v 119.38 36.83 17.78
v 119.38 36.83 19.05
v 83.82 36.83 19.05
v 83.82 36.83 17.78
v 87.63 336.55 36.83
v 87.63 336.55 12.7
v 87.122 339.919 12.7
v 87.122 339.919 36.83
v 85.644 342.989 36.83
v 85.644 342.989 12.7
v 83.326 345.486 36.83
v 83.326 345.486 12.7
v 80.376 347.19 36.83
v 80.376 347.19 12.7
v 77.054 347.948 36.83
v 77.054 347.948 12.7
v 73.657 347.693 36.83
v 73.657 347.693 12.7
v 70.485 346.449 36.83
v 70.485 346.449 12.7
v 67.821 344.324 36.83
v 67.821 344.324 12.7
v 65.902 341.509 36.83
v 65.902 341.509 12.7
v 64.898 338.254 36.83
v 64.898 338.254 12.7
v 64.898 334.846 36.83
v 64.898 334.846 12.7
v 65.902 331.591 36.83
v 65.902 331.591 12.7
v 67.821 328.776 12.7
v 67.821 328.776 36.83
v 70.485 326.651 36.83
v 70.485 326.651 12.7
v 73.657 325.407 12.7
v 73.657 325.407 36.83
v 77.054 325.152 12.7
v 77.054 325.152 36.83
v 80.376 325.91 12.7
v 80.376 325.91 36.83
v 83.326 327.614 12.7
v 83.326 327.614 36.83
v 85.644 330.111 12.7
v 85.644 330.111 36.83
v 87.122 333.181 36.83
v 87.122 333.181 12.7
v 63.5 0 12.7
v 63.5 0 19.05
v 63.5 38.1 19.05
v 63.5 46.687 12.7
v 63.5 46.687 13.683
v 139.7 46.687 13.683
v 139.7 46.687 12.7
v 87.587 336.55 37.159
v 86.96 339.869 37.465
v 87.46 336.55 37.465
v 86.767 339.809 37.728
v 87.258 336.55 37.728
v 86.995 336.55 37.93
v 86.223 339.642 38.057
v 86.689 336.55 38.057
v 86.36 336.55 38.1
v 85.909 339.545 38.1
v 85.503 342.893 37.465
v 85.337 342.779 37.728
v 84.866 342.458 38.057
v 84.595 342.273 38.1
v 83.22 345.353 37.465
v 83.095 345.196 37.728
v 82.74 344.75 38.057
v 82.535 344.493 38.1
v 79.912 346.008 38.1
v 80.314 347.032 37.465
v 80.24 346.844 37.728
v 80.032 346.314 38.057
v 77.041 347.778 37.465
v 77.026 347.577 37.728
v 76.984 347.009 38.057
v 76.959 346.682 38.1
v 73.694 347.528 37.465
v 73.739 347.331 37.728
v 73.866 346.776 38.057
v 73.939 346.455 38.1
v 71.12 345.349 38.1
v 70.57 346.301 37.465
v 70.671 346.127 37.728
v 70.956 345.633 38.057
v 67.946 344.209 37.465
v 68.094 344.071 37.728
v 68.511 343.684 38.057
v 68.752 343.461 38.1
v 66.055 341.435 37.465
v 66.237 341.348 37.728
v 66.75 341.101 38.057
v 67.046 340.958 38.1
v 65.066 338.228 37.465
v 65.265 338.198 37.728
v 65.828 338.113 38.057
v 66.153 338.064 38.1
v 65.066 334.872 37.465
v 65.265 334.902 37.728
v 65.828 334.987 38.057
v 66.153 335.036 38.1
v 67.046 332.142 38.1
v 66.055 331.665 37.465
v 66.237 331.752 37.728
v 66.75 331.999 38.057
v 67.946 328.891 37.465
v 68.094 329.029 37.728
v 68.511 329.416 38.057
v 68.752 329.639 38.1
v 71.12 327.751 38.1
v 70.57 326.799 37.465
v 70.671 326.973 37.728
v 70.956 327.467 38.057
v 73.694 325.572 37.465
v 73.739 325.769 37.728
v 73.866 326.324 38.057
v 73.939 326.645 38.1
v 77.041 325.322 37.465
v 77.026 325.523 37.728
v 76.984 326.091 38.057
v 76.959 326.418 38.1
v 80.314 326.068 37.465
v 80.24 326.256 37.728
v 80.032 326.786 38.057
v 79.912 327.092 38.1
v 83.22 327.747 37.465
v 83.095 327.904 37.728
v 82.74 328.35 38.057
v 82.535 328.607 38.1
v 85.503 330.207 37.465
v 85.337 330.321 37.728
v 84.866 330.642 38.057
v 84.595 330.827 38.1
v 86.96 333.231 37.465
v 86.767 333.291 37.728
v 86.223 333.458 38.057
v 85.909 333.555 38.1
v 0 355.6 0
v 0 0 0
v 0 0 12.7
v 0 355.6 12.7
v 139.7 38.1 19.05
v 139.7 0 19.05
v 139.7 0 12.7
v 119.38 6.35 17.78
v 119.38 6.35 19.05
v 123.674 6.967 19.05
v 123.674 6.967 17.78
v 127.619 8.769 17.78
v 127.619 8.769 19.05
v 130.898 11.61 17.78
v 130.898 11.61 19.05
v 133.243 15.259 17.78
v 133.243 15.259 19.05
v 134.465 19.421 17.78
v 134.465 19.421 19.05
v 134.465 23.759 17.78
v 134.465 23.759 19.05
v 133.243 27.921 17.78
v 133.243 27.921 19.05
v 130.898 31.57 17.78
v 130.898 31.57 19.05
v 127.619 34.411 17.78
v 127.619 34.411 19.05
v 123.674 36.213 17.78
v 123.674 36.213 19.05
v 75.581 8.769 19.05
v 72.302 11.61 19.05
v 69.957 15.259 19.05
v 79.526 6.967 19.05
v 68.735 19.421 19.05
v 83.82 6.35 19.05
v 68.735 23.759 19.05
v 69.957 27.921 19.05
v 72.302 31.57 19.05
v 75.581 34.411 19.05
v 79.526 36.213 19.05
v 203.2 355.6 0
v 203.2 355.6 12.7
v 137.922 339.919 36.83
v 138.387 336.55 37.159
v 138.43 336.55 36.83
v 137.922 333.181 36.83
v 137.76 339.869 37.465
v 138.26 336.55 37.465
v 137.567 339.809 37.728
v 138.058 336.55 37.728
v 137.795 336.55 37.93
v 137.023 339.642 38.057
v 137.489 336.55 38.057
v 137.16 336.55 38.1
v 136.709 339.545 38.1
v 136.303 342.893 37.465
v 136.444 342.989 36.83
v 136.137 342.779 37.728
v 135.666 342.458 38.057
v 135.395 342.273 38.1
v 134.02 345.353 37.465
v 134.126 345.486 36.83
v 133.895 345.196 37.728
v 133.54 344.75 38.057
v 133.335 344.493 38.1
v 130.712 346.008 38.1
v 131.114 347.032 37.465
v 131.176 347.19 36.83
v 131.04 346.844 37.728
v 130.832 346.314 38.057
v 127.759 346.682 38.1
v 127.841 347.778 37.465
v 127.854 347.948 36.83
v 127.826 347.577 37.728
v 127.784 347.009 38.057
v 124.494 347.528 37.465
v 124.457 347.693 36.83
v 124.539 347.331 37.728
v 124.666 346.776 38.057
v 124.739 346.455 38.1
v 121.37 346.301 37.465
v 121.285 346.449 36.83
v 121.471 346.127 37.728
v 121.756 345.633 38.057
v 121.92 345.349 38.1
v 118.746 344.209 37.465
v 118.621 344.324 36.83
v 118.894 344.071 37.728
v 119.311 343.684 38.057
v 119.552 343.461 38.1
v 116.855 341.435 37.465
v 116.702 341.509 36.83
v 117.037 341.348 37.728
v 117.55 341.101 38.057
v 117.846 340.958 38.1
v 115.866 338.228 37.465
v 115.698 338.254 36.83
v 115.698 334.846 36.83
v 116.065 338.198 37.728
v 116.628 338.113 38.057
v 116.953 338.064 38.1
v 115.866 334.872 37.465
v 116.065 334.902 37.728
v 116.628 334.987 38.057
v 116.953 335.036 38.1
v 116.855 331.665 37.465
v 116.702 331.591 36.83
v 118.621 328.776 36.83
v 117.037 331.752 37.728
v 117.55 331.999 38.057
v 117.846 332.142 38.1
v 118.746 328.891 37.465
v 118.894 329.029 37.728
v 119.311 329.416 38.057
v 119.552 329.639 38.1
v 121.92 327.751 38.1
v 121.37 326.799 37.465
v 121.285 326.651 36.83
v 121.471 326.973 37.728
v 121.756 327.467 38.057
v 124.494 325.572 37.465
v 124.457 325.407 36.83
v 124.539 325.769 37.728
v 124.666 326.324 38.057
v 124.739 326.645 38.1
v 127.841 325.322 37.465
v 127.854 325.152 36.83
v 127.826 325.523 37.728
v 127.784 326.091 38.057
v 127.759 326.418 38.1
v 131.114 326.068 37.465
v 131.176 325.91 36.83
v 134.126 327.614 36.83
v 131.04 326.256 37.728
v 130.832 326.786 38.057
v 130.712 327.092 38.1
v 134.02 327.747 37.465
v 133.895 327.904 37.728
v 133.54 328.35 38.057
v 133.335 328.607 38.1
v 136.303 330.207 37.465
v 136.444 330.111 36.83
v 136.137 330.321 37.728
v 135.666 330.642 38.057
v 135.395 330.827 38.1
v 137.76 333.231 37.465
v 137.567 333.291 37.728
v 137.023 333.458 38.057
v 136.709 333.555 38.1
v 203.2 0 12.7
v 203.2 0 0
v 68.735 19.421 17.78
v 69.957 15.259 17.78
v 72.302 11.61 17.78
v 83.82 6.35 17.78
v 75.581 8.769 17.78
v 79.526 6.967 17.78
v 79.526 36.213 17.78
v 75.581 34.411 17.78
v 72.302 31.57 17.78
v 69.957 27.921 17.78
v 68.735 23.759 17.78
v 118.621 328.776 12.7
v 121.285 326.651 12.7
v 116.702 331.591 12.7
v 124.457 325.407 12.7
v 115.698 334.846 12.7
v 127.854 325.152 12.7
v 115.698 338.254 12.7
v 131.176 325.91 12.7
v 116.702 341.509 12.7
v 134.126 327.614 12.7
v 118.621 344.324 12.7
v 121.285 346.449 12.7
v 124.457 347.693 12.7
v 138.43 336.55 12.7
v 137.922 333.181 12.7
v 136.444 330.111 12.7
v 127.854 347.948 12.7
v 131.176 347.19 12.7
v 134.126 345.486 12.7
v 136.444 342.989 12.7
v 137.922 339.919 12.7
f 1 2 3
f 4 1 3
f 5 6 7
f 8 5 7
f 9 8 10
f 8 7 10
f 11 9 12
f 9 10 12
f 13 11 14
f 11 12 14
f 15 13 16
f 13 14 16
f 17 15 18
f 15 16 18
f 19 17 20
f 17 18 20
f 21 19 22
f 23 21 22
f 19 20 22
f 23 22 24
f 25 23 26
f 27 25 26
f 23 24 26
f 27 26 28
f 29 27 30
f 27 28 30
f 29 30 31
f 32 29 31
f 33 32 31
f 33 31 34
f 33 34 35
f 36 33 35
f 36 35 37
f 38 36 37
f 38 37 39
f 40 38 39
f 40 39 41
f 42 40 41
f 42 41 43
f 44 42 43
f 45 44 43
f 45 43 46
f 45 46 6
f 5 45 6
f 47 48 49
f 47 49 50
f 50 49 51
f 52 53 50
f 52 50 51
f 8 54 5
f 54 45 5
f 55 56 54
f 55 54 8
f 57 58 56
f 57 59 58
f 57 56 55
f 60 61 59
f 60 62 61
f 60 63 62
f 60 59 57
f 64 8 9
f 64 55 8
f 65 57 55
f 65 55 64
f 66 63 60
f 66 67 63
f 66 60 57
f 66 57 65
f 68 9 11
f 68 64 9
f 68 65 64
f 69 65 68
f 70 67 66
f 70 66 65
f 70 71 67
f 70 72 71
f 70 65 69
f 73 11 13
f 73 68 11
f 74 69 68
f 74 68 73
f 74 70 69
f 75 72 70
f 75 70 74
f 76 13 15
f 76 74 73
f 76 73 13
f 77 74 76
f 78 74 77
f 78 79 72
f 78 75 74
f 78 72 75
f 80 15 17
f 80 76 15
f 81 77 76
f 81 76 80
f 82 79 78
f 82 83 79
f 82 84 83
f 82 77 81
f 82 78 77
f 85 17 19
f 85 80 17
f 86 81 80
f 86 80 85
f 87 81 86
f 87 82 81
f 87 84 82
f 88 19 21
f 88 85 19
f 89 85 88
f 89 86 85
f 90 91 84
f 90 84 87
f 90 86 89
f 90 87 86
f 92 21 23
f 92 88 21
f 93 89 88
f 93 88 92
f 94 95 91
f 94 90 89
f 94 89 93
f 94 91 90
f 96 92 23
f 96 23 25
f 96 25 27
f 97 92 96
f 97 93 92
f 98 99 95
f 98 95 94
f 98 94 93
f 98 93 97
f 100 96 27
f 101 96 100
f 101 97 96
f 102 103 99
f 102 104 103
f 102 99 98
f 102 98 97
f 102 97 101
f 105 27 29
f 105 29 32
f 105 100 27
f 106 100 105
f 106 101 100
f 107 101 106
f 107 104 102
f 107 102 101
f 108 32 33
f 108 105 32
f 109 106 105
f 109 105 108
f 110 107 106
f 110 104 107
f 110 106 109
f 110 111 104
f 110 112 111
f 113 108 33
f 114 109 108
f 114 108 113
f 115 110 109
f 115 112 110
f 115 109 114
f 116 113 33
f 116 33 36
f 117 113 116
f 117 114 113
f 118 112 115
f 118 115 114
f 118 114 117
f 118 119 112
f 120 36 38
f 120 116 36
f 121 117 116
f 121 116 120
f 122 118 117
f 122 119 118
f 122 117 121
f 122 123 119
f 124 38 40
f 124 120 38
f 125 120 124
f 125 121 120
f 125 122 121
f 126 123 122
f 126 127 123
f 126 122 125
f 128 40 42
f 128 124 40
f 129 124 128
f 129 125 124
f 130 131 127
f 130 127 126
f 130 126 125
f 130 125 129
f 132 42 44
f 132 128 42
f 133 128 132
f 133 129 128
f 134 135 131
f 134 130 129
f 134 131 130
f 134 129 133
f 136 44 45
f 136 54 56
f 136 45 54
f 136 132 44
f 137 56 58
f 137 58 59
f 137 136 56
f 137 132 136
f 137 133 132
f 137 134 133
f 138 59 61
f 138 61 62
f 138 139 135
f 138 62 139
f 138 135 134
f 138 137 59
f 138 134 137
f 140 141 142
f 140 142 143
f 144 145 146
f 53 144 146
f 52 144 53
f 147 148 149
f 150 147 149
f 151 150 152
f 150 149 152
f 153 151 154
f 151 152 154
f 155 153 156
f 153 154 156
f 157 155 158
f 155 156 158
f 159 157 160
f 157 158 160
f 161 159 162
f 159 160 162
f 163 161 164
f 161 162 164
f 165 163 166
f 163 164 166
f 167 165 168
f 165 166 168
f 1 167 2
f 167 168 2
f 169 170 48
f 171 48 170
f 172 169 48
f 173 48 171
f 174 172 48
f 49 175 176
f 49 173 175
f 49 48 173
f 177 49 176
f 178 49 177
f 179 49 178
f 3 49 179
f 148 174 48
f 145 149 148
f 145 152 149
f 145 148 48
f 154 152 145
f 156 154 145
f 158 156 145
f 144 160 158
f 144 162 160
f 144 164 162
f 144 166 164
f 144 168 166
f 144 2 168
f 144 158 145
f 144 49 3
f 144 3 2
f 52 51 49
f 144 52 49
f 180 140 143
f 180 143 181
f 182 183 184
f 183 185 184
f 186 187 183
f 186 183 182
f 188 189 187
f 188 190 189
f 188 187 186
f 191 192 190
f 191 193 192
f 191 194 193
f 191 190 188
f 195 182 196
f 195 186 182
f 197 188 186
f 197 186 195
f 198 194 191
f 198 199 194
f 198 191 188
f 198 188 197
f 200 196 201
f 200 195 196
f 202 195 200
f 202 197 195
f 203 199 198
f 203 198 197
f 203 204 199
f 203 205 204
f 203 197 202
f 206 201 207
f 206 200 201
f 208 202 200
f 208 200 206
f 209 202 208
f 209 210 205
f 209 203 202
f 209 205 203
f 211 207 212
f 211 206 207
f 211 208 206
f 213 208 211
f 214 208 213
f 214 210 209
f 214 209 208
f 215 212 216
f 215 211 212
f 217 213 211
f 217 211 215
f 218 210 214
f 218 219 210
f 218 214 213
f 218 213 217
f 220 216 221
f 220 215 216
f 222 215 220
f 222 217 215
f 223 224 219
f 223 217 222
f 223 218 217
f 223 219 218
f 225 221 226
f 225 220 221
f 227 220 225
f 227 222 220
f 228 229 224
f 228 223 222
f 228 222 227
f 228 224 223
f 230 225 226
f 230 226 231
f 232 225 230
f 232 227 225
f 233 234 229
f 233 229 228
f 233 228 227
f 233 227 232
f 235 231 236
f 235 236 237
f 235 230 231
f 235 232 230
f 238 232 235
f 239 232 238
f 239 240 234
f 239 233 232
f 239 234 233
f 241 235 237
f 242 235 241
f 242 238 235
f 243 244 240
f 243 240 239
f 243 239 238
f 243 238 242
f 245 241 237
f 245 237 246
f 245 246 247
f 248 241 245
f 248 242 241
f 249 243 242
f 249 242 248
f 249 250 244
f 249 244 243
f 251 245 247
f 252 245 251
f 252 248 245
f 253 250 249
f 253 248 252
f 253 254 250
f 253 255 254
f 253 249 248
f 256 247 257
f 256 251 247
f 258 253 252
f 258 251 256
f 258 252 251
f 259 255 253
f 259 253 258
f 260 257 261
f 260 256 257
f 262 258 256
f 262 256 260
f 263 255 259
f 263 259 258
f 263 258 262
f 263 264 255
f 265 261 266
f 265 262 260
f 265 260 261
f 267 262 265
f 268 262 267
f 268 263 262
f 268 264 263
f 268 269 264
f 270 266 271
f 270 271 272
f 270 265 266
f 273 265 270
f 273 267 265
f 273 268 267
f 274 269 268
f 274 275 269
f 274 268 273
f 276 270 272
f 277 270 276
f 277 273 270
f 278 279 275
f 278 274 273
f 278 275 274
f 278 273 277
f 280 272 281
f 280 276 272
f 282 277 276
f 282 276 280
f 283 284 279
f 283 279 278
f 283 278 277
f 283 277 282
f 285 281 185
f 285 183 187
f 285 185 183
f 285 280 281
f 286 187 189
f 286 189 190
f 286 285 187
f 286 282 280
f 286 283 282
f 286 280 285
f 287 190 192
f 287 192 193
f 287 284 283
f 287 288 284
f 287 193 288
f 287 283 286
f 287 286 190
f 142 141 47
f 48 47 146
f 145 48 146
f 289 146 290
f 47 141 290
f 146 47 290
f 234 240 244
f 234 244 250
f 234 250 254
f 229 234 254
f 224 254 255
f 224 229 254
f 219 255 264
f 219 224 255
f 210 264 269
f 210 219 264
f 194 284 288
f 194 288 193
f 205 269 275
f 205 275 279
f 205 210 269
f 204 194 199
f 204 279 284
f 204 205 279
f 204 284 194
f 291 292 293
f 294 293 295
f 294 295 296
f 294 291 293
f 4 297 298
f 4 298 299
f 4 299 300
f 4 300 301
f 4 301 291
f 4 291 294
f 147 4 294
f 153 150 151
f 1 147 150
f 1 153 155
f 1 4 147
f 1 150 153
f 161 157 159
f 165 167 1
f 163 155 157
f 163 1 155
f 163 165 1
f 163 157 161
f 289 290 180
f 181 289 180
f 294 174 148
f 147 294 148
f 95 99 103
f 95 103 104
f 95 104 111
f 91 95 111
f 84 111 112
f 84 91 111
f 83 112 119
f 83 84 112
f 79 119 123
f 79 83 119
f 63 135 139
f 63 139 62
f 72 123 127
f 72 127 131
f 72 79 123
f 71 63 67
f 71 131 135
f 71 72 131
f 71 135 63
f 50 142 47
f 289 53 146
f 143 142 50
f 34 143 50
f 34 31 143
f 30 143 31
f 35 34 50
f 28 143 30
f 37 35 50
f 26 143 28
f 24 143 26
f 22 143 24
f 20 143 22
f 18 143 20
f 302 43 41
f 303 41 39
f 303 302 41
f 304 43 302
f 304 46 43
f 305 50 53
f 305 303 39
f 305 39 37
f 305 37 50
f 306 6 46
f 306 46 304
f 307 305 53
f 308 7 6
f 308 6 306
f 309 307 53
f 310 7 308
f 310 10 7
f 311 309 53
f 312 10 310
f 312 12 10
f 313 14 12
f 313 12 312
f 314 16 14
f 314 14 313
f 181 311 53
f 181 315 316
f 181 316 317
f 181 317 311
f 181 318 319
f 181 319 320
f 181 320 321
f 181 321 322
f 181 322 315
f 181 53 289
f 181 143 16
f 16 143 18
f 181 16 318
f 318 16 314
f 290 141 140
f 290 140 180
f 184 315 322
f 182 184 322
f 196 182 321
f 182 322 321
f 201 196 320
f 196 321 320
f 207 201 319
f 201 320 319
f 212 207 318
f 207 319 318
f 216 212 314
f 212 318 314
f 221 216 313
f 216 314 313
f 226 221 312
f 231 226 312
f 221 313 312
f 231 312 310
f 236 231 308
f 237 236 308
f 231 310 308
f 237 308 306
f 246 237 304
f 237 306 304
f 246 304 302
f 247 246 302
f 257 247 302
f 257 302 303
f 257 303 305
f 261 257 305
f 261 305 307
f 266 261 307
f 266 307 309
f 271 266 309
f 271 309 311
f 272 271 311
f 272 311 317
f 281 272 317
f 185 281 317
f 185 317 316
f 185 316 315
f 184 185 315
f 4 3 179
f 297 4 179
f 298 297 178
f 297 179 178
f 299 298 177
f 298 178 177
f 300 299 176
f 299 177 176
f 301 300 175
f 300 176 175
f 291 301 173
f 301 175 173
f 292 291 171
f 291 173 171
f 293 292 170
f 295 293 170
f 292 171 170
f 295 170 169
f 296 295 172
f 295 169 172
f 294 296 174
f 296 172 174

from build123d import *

# Parameters (mm, degrees)
F0_W     = 203.2
F0_H     = 355.6
F1_DEPTH = 12.7
F2_R     = 11.43
F3_DEPTH = 38.1
F4_W     = 76.2
F4_H     = 38.1
F5_DEPTH = 6.35
F7_DEPTH = 1.27
F9_DEPTH = 76.2
F10_R    = 1.27


with BuildPart() as f1:
    # F0 (on Top) → F1 (new body)
    with BuildSketch(Plane.XY):
        with Locations((101.6, 177.8)):
            Rectangle(F0_W, F0_H)
    extrude(amount=F1_DEPTH)

    # F2 (on face) → F3 (join)
    with BuildSketch(Plane.XY):
        with Locations((76.2, 336.55)):
            Circle(F2_R)
        with Locations((127, 336.55)):
            Circle(F2_R)
    extrude(amount=F3_DEPTH)

    # F4 (on face) → F5 (join)
    with BuildSketch(Plane.XY.offset(12.7)):
        with Locations((101.6, 19.05)):
            Rectangle(F4_W, F4_H)
    extrude(amount=F5_DEPTH)

    # F6 (on face) → F7 (cut)
    with BuildSketch(Plane.XY.offset(19.05)):
        with BuildLine():
            Line((119.38, 36.83), (83.82, 36.83))
            ThreePointArc((83.82, 36.83), (68.58, 21.59), (83.82, 6.35))
            Line((83.82, 6.35), (119.38, 6.35))
            ThreePointArc((119.38, 6.35), (134.62, 21.59), (119.38, 36.83))
        make_face()
    extrude(amount=-F7_DEPTH, mode=Mode.SUBTRACT)

    # F8 (on face) → F9 (join)
    with BuildSketch(Plane.YZ.offset(139.7)):
        Polygon((46.687422, 13.682861), (38.1, 19.05), (38.1, 12.7), (46.687422, 12.7), align=None)
    extrude(amount=-F9_DEPTH)

    # F10
    f10_edges = [f1.edges().sort_by_distance(p)[0] for p in [
        (64.77, 336.55, 38.1),
        (115.57, 336.55, 38.1),
    ]]
    fillet(f10_edges, radius=F10_R)


solid = f1.part
